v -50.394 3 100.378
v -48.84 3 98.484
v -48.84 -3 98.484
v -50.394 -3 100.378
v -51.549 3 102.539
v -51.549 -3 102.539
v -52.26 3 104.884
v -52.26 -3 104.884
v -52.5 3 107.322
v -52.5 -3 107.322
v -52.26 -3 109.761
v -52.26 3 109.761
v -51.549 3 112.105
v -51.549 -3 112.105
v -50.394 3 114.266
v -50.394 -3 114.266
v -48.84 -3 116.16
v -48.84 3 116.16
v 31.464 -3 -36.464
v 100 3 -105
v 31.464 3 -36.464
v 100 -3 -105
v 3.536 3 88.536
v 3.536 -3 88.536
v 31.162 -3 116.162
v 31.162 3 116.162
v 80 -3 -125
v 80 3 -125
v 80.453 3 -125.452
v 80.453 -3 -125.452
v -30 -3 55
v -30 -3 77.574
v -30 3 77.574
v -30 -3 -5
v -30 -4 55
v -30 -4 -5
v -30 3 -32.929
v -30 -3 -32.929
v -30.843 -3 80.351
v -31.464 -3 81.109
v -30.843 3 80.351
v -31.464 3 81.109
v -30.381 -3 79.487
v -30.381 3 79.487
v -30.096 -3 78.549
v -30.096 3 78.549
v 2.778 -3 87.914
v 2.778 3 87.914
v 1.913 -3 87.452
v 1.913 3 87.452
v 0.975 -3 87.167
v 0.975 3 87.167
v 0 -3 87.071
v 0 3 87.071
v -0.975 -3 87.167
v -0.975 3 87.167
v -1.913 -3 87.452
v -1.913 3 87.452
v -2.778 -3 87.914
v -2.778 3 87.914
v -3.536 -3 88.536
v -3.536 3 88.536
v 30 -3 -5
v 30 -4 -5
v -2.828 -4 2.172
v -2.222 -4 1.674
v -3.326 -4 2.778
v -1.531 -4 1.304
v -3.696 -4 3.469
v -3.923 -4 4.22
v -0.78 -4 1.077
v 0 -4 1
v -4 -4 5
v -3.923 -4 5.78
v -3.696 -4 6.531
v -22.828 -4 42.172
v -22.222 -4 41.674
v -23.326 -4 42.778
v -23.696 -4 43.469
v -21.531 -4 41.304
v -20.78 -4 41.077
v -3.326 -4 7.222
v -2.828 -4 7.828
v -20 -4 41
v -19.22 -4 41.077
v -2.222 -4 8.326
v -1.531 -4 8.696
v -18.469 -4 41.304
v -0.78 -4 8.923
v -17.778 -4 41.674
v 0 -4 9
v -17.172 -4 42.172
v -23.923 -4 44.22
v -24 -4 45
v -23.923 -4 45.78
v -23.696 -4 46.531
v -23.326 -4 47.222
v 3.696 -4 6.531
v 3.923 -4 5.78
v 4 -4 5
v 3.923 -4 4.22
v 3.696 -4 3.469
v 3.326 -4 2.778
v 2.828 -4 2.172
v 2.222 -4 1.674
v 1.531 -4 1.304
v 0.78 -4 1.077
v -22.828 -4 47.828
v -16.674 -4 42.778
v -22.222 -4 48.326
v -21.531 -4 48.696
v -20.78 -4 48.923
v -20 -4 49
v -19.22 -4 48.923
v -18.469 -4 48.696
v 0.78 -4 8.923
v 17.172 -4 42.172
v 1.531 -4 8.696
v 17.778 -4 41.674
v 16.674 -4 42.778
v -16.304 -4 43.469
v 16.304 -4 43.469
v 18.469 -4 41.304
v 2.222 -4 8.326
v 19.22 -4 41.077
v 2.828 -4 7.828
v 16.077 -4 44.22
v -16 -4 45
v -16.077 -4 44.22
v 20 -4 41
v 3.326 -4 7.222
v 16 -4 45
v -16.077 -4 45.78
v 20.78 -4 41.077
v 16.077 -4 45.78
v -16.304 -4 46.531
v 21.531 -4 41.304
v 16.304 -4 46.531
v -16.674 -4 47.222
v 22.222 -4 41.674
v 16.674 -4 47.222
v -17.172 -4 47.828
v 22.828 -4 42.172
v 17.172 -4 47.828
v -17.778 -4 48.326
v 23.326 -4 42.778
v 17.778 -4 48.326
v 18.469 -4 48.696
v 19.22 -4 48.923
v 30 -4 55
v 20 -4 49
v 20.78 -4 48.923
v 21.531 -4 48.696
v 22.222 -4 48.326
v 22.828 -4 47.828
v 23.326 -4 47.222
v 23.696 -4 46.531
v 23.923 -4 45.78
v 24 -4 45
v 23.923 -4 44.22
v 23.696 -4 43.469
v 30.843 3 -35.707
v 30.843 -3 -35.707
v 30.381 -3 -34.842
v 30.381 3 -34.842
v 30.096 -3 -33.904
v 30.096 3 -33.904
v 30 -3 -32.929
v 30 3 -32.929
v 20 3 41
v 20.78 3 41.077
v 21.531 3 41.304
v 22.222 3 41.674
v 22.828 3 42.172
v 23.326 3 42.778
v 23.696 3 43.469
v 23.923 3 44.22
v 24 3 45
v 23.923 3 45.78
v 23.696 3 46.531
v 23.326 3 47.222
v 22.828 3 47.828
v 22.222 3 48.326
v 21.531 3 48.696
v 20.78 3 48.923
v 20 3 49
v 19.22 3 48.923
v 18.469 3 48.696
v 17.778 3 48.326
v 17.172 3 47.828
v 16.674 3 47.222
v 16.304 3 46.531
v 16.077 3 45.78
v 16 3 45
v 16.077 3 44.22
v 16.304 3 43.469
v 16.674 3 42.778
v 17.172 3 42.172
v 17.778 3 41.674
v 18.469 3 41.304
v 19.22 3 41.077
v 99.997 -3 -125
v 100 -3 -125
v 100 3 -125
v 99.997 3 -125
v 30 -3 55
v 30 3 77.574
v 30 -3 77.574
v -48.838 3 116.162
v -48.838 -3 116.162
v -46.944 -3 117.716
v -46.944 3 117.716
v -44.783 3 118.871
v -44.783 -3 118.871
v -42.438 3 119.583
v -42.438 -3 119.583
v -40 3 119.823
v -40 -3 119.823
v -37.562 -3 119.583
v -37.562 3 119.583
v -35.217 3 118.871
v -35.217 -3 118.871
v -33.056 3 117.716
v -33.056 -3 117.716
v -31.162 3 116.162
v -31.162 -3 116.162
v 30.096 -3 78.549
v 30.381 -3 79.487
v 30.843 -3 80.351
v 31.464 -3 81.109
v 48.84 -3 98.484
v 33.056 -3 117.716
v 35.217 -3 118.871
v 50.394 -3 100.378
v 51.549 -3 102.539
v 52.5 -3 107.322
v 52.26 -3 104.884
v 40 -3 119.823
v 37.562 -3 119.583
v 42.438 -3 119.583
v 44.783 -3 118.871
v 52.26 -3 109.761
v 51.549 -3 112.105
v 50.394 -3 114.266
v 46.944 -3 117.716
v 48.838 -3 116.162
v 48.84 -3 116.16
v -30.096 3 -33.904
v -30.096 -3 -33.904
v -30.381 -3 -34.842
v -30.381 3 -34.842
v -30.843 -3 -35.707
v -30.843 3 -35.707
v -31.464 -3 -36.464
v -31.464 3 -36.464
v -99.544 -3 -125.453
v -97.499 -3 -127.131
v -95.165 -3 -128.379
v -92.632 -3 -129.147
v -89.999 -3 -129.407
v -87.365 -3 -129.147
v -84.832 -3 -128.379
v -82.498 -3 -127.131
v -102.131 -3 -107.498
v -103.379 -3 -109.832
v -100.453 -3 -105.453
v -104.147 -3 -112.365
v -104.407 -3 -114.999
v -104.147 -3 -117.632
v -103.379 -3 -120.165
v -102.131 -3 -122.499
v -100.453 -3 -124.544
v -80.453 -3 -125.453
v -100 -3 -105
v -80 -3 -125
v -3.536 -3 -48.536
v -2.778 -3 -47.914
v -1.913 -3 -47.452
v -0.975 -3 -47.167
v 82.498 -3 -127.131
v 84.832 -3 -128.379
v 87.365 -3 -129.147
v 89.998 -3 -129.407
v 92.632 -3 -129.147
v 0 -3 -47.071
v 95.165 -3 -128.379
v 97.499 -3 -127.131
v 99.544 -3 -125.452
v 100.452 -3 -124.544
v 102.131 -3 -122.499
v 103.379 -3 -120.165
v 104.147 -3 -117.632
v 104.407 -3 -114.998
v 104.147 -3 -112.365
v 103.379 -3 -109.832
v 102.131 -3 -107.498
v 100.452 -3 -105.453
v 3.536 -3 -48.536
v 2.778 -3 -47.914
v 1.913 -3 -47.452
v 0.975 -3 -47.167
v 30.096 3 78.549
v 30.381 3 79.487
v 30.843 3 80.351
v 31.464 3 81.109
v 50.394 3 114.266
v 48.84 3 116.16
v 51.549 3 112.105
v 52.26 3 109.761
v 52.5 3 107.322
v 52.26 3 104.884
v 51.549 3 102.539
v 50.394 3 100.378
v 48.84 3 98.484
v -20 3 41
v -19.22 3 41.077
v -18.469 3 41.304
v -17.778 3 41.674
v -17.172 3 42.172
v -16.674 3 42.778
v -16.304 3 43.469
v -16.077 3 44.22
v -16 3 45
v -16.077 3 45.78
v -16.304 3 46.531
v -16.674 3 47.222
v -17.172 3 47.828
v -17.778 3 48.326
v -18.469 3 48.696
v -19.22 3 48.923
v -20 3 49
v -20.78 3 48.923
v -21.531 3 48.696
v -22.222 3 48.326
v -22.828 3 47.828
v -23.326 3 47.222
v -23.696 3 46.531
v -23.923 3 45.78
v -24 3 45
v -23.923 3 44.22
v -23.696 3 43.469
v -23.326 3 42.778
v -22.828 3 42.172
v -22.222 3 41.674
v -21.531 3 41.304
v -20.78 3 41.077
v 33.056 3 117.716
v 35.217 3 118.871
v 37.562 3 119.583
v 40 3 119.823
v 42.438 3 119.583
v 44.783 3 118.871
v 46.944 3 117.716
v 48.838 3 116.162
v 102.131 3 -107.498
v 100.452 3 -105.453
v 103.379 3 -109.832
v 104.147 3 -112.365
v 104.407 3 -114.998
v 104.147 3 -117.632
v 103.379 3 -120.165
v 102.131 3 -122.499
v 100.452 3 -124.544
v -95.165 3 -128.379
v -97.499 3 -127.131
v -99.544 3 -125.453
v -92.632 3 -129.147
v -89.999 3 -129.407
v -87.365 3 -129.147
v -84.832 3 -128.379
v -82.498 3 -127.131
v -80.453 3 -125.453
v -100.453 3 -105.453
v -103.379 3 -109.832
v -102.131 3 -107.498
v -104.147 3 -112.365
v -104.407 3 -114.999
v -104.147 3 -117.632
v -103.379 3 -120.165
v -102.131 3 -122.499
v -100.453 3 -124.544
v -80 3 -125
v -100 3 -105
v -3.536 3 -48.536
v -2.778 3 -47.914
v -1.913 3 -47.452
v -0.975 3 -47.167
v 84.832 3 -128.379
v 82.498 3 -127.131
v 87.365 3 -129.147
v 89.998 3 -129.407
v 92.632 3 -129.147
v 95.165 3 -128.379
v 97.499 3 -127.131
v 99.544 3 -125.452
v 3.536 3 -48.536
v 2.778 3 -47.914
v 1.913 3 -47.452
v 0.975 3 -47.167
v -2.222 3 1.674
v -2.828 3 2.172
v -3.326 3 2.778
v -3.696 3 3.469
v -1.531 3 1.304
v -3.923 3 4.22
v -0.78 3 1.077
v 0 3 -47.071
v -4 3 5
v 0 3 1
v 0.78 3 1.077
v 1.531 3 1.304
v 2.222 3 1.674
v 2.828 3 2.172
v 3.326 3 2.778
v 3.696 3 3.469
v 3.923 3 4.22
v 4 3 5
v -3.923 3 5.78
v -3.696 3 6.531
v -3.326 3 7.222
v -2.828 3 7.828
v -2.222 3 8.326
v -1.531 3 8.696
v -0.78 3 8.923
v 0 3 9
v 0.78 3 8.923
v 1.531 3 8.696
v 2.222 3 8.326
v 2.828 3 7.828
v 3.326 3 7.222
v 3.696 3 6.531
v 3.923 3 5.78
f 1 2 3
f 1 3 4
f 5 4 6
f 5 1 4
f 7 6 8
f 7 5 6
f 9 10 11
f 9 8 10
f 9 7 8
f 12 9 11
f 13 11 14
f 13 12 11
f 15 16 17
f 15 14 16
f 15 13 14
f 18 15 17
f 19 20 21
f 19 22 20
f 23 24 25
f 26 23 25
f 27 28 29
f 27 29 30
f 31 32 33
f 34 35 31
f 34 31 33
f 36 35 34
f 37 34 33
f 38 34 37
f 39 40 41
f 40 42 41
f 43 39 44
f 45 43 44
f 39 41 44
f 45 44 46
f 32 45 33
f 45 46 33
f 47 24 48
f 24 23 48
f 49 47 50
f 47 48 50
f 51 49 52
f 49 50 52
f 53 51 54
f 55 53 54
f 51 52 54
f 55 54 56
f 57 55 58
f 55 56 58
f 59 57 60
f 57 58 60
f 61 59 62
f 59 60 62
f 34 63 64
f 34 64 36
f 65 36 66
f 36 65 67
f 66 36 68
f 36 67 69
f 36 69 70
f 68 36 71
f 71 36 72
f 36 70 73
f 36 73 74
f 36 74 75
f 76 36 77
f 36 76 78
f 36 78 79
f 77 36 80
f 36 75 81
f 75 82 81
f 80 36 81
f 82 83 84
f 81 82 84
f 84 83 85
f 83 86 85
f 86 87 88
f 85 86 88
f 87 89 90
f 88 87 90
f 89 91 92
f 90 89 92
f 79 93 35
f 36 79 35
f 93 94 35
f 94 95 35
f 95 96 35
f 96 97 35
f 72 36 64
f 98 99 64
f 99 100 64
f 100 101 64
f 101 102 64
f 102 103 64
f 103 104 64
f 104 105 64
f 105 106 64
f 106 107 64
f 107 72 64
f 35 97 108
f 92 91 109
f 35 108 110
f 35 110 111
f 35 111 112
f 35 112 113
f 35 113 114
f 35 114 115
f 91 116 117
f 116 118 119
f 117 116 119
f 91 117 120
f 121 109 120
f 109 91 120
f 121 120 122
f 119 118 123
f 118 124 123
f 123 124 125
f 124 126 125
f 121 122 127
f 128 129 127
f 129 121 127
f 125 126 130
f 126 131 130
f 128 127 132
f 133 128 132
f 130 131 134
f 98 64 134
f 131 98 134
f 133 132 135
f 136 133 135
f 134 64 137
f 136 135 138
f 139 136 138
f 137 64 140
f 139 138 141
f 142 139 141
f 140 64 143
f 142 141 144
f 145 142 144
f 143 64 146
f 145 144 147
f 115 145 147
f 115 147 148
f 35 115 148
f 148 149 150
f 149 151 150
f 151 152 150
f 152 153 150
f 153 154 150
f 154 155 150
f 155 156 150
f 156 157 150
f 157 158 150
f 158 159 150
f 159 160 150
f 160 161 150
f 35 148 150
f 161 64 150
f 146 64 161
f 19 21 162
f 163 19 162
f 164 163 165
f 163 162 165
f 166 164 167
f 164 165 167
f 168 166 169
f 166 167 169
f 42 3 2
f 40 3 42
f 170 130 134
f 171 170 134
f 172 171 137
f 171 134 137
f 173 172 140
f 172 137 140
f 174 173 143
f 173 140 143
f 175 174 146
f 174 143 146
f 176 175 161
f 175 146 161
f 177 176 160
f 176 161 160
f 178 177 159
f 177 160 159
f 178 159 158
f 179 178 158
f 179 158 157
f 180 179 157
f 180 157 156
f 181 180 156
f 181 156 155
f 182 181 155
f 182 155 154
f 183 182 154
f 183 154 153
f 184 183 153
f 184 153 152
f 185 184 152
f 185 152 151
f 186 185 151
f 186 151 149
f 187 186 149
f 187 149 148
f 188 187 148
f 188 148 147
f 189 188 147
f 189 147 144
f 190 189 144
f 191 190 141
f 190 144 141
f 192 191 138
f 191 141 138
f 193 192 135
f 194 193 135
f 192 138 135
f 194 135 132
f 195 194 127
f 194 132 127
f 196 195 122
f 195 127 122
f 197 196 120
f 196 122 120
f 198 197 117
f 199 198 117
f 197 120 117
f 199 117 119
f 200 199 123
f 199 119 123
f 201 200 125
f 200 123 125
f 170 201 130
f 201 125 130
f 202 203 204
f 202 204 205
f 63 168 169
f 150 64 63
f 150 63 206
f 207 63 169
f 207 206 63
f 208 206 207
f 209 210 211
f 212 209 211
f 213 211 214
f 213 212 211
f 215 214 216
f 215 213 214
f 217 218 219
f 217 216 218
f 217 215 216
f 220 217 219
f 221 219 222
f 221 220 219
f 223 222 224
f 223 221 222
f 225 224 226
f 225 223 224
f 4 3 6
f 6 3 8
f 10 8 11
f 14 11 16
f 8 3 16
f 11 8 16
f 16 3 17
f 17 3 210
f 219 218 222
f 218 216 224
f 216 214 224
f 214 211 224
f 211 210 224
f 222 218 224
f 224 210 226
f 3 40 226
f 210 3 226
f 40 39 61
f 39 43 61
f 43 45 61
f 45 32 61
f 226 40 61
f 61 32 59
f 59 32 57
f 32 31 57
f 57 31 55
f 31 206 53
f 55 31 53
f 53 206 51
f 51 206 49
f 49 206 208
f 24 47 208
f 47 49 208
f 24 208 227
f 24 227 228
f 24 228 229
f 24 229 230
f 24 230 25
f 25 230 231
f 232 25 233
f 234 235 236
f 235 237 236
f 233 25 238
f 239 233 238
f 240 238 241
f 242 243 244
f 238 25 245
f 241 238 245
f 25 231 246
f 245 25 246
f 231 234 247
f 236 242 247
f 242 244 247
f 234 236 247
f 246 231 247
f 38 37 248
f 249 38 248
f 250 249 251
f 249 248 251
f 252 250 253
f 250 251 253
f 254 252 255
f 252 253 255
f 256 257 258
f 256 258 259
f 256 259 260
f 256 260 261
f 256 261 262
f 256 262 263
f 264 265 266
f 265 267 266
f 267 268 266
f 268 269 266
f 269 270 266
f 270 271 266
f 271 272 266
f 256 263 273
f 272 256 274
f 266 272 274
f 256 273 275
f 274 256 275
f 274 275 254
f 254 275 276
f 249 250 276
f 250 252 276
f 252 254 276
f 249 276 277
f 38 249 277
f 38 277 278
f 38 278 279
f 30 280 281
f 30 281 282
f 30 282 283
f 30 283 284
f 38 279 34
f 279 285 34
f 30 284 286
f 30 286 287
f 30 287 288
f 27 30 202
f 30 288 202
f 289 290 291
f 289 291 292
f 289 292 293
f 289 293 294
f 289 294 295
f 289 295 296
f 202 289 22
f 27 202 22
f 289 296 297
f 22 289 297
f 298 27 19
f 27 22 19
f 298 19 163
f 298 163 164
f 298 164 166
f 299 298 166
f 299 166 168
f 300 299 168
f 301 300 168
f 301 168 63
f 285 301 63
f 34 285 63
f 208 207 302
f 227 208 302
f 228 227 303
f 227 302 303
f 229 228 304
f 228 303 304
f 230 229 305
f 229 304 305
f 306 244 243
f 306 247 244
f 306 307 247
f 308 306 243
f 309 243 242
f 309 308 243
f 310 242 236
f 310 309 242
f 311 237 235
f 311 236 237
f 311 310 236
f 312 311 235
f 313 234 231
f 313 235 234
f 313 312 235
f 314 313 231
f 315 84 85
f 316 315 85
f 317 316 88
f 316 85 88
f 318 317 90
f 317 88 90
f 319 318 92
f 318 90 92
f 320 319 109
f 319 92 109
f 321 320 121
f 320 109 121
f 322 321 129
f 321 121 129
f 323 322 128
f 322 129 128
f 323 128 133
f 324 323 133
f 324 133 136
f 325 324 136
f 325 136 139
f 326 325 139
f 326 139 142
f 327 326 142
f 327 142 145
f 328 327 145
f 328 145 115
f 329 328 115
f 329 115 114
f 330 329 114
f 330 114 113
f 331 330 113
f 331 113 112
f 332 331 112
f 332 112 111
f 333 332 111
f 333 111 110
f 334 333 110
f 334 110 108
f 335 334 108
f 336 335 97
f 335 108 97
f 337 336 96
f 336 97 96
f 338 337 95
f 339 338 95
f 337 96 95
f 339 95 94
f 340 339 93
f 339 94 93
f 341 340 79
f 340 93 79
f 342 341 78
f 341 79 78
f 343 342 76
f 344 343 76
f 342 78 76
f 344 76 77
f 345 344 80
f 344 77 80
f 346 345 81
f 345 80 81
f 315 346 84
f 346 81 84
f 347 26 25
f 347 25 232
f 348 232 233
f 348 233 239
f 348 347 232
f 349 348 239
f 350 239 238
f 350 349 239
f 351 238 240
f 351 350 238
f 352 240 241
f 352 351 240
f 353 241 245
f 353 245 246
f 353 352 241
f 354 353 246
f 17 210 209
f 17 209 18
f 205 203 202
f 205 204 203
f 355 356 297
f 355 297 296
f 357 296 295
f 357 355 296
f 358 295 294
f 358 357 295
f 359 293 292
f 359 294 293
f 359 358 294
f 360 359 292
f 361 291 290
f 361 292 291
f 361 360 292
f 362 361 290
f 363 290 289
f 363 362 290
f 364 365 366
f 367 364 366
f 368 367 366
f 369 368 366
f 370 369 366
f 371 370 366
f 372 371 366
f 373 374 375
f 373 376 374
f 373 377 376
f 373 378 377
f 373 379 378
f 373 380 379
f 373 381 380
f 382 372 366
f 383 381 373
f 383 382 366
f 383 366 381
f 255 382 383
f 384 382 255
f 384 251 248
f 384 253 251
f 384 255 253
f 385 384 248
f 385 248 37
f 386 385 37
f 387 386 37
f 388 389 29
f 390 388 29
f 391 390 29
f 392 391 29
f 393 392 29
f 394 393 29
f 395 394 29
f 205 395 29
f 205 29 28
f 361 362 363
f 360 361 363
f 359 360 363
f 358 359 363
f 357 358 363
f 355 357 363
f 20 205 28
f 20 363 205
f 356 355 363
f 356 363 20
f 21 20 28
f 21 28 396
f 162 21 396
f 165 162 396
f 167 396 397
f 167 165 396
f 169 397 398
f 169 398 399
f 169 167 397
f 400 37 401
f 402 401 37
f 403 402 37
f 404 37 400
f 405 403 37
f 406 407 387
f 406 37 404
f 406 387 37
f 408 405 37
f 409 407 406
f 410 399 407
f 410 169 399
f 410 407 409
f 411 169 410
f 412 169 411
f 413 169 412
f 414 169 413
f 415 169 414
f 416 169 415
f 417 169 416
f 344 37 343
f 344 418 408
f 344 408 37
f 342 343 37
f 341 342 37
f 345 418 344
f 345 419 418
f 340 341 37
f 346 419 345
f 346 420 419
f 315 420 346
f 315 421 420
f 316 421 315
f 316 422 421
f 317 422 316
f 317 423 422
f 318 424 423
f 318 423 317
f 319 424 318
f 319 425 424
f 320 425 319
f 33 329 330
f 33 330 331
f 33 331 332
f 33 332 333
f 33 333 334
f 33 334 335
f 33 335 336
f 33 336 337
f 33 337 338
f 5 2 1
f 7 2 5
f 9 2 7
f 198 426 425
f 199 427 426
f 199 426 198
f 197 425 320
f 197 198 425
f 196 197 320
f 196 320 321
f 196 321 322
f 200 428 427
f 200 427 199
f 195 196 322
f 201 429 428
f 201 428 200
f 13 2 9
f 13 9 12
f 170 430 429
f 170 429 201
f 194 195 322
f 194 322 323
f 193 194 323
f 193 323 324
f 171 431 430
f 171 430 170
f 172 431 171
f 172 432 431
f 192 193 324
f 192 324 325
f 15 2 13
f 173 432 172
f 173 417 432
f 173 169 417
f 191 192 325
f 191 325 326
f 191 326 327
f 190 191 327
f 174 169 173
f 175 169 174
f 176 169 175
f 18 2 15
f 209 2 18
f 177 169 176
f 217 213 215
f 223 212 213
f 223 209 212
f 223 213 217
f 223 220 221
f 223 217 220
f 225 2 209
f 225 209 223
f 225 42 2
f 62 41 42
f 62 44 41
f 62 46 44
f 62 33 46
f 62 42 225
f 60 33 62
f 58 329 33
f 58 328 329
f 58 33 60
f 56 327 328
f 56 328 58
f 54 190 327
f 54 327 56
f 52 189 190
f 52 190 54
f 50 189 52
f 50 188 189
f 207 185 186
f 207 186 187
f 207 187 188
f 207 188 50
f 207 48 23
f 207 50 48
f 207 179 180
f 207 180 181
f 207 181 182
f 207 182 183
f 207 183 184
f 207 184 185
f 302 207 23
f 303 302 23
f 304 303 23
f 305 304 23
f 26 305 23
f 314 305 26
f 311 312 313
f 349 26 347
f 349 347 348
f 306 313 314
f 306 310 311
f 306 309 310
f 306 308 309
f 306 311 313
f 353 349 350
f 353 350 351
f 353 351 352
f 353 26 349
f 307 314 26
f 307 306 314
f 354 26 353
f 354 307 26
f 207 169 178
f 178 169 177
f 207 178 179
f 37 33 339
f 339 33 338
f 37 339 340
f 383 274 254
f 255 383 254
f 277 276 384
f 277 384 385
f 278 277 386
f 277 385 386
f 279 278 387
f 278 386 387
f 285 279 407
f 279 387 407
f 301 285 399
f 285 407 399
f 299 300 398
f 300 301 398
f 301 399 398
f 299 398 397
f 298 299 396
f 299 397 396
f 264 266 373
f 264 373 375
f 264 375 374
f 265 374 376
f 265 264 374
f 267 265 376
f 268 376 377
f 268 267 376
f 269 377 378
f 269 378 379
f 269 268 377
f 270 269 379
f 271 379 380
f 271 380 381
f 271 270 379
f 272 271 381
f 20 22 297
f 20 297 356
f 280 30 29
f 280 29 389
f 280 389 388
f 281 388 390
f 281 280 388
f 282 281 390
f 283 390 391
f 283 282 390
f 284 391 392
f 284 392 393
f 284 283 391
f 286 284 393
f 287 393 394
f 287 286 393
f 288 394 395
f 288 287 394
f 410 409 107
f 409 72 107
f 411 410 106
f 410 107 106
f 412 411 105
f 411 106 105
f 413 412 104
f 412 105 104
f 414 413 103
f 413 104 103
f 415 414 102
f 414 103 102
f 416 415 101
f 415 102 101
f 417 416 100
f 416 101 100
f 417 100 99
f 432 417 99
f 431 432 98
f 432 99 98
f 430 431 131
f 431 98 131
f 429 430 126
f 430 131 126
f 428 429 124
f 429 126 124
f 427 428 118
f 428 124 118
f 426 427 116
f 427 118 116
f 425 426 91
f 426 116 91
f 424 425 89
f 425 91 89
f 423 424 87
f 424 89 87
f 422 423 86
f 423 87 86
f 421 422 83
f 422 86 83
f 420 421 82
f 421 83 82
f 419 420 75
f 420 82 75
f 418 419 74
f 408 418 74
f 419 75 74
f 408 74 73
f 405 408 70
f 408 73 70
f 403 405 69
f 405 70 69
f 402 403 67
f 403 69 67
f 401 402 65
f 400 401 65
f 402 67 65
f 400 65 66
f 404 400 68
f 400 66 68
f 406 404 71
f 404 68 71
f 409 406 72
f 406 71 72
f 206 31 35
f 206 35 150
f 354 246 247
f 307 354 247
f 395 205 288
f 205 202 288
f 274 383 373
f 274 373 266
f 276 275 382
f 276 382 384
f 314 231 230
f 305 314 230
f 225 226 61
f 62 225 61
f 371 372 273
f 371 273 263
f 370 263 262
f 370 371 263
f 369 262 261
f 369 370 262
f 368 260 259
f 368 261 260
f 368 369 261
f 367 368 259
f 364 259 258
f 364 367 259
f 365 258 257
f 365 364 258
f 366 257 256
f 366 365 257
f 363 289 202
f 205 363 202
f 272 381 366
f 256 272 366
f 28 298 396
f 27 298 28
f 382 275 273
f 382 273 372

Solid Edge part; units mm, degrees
sketch "Sketch1" plane through (0, 0, 0) normal (0, -1, 0) x (1, 0, 0)
  line L0 (-100, 125) -> (100, 125)
  line L1 (100, 125) -> (100, -125)
  line L2 (100, -125) -> (-100, -125)
  line L3 (-100, -125) -> (-100, 125)
  dimension "D1" = 200
  dimension "D2" = 250
extrude "Protrusion1" add sketch "Sketch1" along normal mid plane 6
sketch "Sketch2" plane through (0, -3, 0) normal (0, -1, 0) x (1, 0, 0)
  line L0 (-30, 55) -> (30, 55)
  line L1 (30, 55) -> (30, -5)
  line L2 (30, -5) -> (-30, -5)
  line L3 (-30, -5) -> (-30, 55)
  dimension "D1" = 70
  dimension "D2" = 60
  dimension "D3" = 60
extrude "Ausprägung_2" add sketch "Sketch2" along normal blind 1
hole "Bohrung_1" at (20, -4, 45) direction (0, 1, 0) diameter 8 end up to next
hole "Hole1" at (0, -4, 5) direction (0, 1, 0) diameter 8 end up to next
hole "Hole2" at (-20, -4, 45) direction (0, 1, 0) diameter 8 end up to next
sketch "Sketch3" plane through (0, -3, 0) normal (0, -1, 0) x (1, 0, 0)
  line L0 (-80, -125) -> (0, -45)
  line L1 (0, -45) -> (80, -125)
  line L2 (-80, -125) -> (80, -125)
  dimension "D1" = 160
  dimension "D2" = 20
extrude "Ausschnitt_1" cut sketch "Sketch3" against normal blind 146.05
sketch "Sketch4" plane through (0, -3, 0) normal (0, -1, 0) x (1, 0, 0)
  line L0 (-100, -105) -> (-30, -35)
  line L1 (-30, -35) -> (-30, -5)
  line L2 (-30, -5) -> (-30, 55)
  line L3 (-30, 55) -> (-100, 55)
  line L4 (-100, 55) -> (-100, -105)
  dimension "D1" = 20
extrude "Ausschnitt_2" cut sketch "Sketch4" against normal blind 200.025
sketch "Sketch5" plane through (0, -3, 0) normal (0, -1, 0) x (1, 0, 0)
  line L0 (100, -105) -> (30, -35)
  line L1 (30, -35) -> (30, -5)
  line L2 (30, -5) -> (30, 55)
  line L3 (30, 55) -> (100, 55)
  line L4 (100, 55) -> (100, -105)
  dimension "D1" = 20
extrude "Ausschnitt_3" cut sketch "Sketch5" against normal blind 184.15
sketch "Sketch6" plane through (0, -3, 90) normal (0, -1, 0) x (1, 0, 0)
  line L0 (-40, 35) -> (0, -5)
  line L1 (0, -5) -> (40, 35)
  line L2 (40, 35) -> (-40, 35)
  dimension "D1" = 80
extrude "Ausschnitt_4" cut sketch "Sketch6" against normal blind 88.9
sketch "Sketch7" plane through (0, -3, 90) normal (0, -1, 0) x (1, 0, 0)
  line L0 (-75.3553, 35) -> (-30, -10.3553)
  line L1 (-30, -10.3553) -> (-30, -35)
  line L2 (-30, -35) -> (-100, -35)
  line L3 (-100, -35) -> (-100, 35)
  line L4 (-100, 35) -> (-75.3553, 35)
  dimension "D1" = 30
extrude "Ausschnitt_5" cut sketch "Sketch7" against normal blind 38.1
sketch "Sketch8" plane through (12.3223, -3, 90) normal (0, -1, 0) x (1, 0, 0)
  line L0 (63.033, 35) -> (17.6777, -10.3553)
  line L1 (17.6777, -10.3553) -> (17.6777, -35)
  line L2 (17.6777, -35) -> (87.6777, -35)
  line L3 (87.6777, -35) -> (87.6777, 35)
  line L4 (87.6777, 35) -> (63.033, 35)
  dimension "D1" = 17.6777
extrude "Ausschnitt_6" cut sketch "Sketch8" against normal blind 104.775
sketch "Sketch9" plane through (0, -3, 90) normal (0, -1, 0) x (1, 0, 0)
  line L0 (-40, 35) -> (-57.6777, 17.3223)
  line L1 (-57.6777, 17.3223) -> (-75.3553, 35)
  line L2 (-75.3553, 35) -> (-40, 35)
extrude "Ausschnitt_7" cut sketch "Sketch9" against normal blind 63.5
sketch "Sketch10" plane through (8.8388, -3, 90) normal (0, -1, 0) x (1, 0, 0)
  line L0 (31.1612, 35) -> (48.8388, 17.3223)
  line L1 (48.8388, 17.3223) -> (66.5165, 35)
  line L2 (66.5165, 35) -> (31.1612, 35)
extrude "Ausschnitt_8" cut sketch "Sketch10" against normal blind 82.55
fillet "Verrundung_1" radius 12.5 4 edges at (-40, 0, 125) (-57.6777, 0, 107.3223) (40, 0, 125) (57.6777, 0, 107.3223)
sketch "Sketch11" plane through (0, -3, -65) normal (0, -1, 0) x (1, 0, 0)
  line L0 (-100, -40) -> (-80, -60)
  line L1 (-100, -40) -> (-100, -60)
  line L2 (-100, -60) -> (-80, -60)
extrude "Ausschnitt_9" cut sketch "Sketch11" against normal blind 60.325
sketch "Sketch12" plane through (-90, 0, -115) normal (-0.7071, 0, -0.7071) x (0, -1, 0)
  line L0 (-3, 14.1421) -> (3, 14.1421)
  line L1 (3, 14.1421) -> (3, -14.1421)
  line L2 (3, -14.1421) -> (-3, -14.1421)
  line L3 (-3, -14.1421) -> (-3, 14.1421)
extrude "Ausprägung_3" add sketch "Sketch12" along normal blind 14.14
sketch "Sketch13" plane through (-4.9992, -3, -69.9992) normal (0, -1, 0) x (-0.7071, 0, 0.7071)
  line L0 (-98.9949, -21.2121) -> (-98.9949, -49.4964)
  line L1 (-98.9949, -49.4964) -> (-113.1371, -35.3543)
  line L2 (-113.1371, -35.3543) -> (-98.9949, -21.2121)
extrude "Ausschnitt_10" cut sketch "Sketch13" against normal blind 63.5
sketch "Sketch14" plane through (90, 0, -115) normal (0.7071, 0, -0.7071) x (0.7071, 0, 0.7071)
  line L0 (-14.1421, 3) -> (14.1421, 3)
  line L1 (14.1421, 3) -> (14.1421, -3)
  line L2 (14.1421, -3) -> (-14.1421, -3)
  line L3 (-14.1421, -3) -> (-14.1421, 3)
extrude "Ausprägung_4" add sketch "Sketch14" along normal blind 14.14
fillet "Verrundung_2" radius 13.5 4 edges at (-109.9985, 0, -114.9985) (-89.9985, 0, -134.9985) (89.9985, 0, -134.9985) (109.9985, 0, -114.9985)
fillet "Verrundung_3" radius 5 6 edges at (-30, 0, -35) (-30, 0, 79.6447) (0, 0, 85) (30, 0, 79.6447) (30, 0, -35) (0, 0, -45)
properties material "Aluminium, 1060"
